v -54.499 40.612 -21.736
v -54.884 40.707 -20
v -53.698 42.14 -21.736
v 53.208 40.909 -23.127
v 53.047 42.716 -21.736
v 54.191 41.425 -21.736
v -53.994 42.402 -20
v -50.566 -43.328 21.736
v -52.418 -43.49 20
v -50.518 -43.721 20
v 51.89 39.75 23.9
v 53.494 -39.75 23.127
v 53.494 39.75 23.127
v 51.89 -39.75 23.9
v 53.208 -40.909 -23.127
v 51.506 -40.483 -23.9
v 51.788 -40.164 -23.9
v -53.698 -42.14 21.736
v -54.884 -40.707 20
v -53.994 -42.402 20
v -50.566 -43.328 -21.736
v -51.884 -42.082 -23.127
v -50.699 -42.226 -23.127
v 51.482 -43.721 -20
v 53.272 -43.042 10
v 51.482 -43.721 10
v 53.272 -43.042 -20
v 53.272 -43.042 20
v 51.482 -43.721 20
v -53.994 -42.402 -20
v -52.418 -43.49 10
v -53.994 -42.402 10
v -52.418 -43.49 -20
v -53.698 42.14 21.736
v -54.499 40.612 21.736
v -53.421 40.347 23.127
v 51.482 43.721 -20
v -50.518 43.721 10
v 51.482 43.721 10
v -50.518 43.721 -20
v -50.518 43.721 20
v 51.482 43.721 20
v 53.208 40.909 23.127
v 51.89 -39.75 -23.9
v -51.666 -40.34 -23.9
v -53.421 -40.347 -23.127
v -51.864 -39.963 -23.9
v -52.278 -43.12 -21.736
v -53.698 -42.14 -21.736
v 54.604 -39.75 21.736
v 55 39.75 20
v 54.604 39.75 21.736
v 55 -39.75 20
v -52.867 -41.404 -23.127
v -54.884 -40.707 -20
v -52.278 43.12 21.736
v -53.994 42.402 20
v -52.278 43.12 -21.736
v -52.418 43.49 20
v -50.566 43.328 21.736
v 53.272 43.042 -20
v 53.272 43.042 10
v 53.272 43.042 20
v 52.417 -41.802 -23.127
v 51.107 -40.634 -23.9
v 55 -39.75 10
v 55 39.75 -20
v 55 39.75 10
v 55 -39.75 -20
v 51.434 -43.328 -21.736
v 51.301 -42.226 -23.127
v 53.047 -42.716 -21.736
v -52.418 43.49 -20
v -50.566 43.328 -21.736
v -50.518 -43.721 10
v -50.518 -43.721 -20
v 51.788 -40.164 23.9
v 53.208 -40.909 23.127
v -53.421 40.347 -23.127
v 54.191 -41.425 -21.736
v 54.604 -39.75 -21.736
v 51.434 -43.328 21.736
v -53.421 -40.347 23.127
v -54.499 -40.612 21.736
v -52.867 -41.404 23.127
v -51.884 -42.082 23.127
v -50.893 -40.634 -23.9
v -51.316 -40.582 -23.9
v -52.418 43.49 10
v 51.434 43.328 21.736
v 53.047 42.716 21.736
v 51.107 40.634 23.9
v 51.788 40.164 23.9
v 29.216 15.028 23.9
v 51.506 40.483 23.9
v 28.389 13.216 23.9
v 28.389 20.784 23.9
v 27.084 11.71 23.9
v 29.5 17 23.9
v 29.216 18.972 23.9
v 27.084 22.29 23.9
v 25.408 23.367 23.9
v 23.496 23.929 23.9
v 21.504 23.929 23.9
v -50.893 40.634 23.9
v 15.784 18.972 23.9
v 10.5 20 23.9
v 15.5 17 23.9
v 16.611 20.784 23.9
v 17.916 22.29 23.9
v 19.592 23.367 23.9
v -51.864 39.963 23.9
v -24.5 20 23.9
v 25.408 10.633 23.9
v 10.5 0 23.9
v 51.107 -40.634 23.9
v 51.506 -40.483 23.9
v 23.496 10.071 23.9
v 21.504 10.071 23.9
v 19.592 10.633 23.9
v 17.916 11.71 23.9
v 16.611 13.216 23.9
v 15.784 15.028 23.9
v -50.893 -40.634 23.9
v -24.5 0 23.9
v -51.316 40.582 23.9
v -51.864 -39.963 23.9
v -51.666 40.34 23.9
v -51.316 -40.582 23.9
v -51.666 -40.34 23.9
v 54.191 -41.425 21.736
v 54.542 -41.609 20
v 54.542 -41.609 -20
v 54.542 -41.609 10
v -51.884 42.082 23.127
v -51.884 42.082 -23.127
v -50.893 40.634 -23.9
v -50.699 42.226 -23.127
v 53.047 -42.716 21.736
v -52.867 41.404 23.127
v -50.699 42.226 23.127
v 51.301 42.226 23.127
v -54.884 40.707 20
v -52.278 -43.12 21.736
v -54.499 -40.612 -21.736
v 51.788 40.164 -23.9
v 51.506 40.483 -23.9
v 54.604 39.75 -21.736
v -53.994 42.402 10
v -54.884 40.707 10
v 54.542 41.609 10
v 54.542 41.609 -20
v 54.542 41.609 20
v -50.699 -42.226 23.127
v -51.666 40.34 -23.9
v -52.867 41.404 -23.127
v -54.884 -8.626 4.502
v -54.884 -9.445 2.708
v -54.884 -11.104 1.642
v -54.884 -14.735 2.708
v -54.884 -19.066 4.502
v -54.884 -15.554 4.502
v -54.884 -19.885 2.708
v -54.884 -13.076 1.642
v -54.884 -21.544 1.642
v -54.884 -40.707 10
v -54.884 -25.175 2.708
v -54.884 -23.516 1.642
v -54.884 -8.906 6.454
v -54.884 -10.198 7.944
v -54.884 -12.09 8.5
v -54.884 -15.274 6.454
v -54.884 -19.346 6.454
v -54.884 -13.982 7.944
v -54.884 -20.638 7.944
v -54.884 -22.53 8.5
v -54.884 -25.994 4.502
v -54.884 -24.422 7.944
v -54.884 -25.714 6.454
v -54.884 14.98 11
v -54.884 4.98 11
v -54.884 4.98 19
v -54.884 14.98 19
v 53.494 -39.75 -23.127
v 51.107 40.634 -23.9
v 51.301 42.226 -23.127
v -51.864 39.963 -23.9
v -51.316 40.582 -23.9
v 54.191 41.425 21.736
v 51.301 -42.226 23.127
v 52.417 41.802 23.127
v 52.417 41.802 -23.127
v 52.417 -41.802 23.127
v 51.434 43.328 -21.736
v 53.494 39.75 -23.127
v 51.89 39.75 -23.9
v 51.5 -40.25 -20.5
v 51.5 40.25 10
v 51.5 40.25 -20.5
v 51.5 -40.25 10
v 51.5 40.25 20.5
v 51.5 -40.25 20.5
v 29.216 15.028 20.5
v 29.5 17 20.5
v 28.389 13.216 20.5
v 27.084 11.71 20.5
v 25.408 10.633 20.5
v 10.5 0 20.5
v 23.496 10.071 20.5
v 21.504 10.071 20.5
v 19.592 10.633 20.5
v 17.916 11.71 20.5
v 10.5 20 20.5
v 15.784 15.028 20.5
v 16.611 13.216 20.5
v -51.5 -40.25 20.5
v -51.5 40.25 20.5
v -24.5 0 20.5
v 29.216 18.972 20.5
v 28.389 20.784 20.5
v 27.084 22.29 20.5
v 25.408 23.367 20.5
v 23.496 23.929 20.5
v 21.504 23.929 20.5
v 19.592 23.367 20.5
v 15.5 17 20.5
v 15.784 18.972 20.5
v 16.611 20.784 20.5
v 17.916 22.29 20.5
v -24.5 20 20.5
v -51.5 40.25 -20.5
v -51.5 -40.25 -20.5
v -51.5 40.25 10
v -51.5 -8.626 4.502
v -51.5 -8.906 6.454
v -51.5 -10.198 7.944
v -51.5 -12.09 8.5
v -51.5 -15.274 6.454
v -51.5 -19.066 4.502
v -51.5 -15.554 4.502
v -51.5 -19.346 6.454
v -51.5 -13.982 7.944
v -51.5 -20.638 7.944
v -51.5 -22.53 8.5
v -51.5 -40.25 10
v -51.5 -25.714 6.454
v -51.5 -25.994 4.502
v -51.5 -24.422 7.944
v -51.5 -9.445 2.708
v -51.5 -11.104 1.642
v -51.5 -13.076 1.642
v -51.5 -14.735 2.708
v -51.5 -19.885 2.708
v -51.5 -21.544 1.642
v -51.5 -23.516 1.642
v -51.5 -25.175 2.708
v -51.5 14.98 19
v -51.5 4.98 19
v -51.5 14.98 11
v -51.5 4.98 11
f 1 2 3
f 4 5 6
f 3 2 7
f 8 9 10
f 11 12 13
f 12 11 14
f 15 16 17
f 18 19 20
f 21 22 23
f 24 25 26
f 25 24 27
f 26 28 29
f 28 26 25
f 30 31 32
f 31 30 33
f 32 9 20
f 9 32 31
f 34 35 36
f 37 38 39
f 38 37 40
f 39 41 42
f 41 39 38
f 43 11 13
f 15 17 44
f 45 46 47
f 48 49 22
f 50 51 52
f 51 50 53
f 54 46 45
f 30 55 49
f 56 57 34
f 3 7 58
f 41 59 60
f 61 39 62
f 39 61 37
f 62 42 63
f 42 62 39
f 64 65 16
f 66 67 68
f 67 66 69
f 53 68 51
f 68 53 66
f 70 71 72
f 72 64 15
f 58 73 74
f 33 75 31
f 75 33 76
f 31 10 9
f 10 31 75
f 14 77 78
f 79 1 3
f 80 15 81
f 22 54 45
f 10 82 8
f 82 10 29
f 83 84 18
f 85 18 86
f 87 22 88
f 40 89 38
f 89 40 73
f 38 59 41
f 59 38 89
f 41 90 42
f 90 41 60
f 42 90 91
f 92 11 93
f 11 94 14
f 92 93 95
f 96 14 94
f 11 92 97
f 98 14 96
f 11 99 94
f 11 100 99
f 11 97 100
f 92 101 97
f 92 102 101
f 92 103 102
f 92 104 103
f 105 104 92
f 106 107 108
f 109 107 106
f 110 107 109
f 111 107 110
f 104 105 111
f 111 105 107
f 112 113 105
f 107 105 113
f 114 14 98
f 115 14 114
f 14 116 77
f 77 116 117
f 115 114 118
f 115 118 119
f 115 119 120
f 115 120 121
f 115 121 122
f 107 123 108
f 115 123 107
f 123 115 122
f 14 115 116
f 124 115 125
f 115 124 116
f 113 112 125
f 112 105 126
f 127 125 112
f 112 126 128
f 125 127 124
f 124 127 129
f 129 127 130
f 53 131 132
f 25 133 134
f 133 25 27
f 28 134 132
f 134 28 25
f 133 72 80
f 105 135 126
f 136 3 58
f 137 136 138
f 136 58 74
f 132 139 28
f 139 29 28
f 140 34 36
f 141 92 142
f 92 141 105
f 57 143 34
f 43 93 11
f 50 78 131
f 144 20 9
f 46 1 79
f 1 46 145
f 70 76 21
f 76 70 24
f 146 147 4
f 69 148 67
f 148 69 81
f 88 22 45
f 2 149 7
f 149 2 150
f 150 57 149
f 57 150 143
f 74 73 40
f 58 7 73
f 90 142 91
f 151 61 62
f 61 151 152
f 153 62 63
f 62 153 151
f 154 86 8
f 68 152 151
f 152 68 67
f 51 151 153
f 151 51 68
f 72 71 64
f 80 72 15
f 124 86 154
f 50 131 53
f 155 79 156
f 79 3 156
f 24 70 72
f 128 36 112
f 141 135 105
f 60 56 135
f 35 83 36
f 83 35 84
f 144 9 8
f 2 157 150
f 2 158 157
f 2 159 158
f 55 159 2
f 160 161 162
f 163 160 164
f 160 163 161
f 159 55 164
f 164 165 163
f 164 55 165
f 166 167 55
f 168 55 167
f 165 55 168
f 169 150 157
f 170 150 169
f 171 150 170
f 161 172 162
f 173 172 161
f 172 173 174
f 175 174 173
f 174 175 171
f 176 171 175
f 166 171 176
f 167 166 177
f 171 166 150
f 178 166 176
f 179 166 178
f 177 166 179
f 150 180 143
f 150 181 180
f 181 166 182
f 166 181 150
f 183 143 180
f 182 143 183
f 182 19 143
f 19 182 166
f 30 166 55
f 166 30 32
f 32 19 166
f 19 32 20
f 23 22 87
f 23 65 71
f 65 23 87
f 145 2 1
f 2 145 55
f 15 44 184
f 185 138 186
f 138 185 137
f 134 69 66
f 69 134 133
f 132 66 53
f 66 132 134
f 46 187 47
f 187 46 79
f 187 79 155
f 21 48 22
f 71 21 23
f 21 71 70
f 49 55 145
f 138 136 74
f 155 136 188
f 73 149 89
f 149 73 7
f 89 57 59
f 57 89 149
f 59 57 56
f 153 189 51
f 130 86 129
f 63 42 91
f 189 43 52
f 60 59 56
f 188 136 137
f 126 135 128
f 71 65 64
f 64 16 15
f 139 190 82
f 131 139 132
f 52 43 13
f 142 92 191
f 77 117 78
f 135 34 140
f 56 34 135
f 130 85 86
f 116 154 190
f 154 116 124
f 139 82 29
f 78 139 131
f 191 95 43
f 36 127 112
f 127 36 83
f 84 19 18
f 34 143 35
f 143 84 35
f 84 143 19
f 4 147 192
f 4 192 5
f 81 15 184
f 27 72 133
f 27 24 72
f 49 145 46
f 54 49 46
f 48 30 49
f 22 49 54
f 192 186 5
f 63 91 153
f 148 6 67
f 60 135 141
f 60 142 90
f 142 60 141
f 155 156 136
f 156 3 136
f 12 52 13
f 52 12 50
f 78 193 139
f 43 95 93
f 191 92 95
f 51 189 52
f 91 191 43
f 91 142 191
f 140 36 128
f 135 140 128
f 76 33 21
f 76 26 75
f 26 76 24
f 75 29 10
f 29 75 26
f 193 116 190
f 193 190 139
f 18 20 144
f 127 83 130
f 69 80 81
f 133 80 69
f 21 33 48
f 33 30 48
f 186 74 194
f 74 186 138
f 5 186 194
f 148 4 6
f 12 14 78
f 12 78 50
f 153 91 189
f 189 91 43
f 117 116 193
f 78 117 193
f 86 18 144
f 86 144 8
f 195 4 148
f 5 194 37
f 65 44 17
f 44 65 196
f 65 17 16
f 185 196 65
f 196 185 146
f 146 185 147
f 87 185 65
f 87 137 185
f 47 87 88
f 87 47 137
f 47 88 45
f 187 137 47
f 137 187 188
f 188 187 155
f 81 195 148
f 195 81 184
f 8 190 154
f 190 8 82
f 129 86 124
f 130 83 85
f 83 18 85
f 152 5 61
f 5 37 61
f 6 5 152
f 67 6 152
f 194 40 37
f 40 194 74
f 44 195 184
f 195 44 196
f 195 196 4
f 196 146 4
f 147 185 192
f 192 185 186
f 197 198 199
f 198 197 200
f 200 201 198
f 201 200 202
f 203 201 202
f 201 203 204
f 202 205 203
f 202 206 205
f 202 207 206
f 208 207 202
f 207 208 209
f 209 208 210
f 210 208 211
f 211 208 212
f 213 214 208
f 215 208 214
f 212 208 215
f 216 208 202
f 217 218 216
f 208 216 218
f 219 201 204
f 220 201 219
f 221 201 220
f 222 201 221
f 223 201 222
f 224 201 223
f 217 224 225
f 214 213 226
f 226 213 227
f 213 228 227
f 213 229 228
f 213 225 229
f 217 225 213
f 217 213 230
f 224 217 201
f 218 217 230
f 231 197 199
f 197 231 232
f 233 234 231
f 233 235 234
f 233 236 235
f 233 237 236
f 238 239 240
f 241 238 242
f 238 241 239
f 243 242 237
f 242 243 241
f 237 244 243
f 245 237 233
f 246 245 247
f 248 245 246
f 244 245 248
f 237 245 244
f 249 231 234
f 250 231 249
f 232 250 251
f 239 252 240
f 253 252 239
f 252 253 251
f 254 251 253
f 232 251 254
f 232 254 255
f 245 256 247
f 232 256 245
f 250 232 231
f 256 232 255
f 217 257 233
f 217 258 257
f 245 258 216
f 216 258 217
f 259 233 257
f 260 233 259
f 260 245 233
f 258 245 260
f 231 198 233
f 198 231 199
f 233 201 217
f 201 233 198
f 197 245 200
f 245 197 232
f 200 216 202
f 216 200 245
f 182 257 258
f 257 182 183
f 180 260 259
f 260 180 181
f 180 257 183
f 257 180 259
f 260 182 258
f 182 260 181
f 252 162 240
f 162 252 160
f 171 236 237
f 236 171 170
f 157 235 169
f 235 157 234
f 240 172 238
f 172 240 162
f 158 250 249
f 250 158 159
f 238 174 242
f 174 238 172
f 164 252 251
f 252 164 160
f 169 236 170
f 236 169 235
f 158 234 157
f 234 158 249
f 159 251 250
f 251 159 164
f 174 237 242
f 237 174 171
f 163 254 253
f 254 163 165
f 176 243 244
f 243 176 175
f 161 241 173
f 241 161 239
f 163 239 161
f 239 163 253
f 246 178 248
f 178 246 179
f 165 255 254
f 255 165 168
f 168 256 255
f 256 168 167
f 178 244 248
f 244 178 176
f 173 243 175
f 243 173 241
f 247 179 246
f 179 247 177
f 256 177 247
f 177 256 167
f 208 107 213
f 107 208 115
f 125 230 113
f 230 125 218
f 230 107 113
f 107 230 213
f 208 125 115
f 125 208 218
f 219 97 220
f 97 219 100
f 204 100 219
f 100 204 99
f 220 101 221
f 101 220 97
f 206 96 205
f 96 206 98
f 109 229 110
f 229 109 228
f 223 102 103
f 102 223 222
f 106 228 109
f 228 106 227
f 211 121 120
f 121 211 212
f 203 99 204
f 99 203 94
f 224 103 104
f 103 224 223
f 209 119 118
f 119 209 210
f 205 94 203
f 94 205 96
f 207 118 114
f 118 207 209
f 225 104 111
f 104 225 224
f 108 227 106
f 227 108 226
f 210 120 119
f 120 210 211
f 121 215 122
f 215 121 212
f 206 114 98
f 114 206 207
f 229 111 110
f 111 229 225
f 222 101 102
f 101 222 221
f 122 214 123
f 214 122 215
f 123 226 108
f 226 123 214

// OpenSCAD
/* This module constructs the main body of the enclosure. First, we name the module: */

//pcb dimensions (mm)
pcb_l = 92; // (x dim, edges of PCB)
pcb_w = 69.5; // (y dim, edges of PCB)
pcb_h = 30; // (z dim, from bottom of PCB to top with placed components / headers / etc)r

buffer = 10; // buffer zone around edges of pcb
wall_thickness = -1; // not sure what's up with this

// box size overall
l = pcb_l+buffer; // x dim
w = pcb_w+buffer; // y dim
h = pcb_h+buffer; // z dim

wall=1; // wall thickness

//top cover width
cover_width=10; 

// button 1
button1_radius = 3.5; //mm
button1_y = -12.09;
button1_z = 5;

// button 2
button2_radius = button1_radius;
button2_y = -22.53;
button2_z = button1_z;

// mic
mic_radius = 7;
mic_x = 22.5;
mic_y = 17;

// usb opening
usb_y = 9.98;
usb_dy = 10;
usb_z = 15;
usb_dz = 8;

//screen
screen_x = -7; //x position of center of screen
screen_y = 10; //y position of center of screen
screen_dx = 35; //length of screen (x dim)
screen_dy = 20; //

module enclosure() {

difference() {

minkowski()
{

difference()
{
translate([0,0,0])
cube([l,w,h], center=true);
};

sphere(h/10);
};

cube([l-wall_thickness,w-wall_thickness,h-wall_thickness], center=true);
}
}

module enclosureHoles() {

union() {

// USB
translate([-l/2-10,usb_y-usb_dy/2,usb_z-usb_dz/2])
cube([10*wall, usb_dy, usb_dz]);
    
// button #1
translate([-l/2,button1_y,button1_z])
rotate([0,-90,0])
cylinder(r=button1_radius, h=10*wall);

// button #2
translate([-l/2,button2_y,button2_z])
rotate([0,-90,0])
cylinder(r=button2_radius, h=10*wall);
    
// Screen
translate([screen_x-screen_dx/2,screen_y-screen_dy/2,h/2])
cube([screen_dx, screen_dy,10*wall]);

// mic
translate([mic_x,mic_y,h/2-10*wall/2])
cylinder(r=mic_radius, h=20*wall);

}
}

module concat() {

difference() {
enclosure();
enclosureHoles();
}
}


// RENDER FULL
//concat();

/* To actually print, we’ll need to render it in two separate halves which we will attach later. So, comment out the above concat() command and instead run the below code to render the top only */


// RENDER COVER (by subtracting bottom)
difference() {
concat();
translate([0,0,-cover_width])
cube([l*1.5,w*1.5,h], center=true);
}



// RENDER BOTTOM (by subtracting top)
difference() {
concat();
translate([0,0,h-cover_width])
cube([l*1.5,w*1.5,h], center=true);
}
